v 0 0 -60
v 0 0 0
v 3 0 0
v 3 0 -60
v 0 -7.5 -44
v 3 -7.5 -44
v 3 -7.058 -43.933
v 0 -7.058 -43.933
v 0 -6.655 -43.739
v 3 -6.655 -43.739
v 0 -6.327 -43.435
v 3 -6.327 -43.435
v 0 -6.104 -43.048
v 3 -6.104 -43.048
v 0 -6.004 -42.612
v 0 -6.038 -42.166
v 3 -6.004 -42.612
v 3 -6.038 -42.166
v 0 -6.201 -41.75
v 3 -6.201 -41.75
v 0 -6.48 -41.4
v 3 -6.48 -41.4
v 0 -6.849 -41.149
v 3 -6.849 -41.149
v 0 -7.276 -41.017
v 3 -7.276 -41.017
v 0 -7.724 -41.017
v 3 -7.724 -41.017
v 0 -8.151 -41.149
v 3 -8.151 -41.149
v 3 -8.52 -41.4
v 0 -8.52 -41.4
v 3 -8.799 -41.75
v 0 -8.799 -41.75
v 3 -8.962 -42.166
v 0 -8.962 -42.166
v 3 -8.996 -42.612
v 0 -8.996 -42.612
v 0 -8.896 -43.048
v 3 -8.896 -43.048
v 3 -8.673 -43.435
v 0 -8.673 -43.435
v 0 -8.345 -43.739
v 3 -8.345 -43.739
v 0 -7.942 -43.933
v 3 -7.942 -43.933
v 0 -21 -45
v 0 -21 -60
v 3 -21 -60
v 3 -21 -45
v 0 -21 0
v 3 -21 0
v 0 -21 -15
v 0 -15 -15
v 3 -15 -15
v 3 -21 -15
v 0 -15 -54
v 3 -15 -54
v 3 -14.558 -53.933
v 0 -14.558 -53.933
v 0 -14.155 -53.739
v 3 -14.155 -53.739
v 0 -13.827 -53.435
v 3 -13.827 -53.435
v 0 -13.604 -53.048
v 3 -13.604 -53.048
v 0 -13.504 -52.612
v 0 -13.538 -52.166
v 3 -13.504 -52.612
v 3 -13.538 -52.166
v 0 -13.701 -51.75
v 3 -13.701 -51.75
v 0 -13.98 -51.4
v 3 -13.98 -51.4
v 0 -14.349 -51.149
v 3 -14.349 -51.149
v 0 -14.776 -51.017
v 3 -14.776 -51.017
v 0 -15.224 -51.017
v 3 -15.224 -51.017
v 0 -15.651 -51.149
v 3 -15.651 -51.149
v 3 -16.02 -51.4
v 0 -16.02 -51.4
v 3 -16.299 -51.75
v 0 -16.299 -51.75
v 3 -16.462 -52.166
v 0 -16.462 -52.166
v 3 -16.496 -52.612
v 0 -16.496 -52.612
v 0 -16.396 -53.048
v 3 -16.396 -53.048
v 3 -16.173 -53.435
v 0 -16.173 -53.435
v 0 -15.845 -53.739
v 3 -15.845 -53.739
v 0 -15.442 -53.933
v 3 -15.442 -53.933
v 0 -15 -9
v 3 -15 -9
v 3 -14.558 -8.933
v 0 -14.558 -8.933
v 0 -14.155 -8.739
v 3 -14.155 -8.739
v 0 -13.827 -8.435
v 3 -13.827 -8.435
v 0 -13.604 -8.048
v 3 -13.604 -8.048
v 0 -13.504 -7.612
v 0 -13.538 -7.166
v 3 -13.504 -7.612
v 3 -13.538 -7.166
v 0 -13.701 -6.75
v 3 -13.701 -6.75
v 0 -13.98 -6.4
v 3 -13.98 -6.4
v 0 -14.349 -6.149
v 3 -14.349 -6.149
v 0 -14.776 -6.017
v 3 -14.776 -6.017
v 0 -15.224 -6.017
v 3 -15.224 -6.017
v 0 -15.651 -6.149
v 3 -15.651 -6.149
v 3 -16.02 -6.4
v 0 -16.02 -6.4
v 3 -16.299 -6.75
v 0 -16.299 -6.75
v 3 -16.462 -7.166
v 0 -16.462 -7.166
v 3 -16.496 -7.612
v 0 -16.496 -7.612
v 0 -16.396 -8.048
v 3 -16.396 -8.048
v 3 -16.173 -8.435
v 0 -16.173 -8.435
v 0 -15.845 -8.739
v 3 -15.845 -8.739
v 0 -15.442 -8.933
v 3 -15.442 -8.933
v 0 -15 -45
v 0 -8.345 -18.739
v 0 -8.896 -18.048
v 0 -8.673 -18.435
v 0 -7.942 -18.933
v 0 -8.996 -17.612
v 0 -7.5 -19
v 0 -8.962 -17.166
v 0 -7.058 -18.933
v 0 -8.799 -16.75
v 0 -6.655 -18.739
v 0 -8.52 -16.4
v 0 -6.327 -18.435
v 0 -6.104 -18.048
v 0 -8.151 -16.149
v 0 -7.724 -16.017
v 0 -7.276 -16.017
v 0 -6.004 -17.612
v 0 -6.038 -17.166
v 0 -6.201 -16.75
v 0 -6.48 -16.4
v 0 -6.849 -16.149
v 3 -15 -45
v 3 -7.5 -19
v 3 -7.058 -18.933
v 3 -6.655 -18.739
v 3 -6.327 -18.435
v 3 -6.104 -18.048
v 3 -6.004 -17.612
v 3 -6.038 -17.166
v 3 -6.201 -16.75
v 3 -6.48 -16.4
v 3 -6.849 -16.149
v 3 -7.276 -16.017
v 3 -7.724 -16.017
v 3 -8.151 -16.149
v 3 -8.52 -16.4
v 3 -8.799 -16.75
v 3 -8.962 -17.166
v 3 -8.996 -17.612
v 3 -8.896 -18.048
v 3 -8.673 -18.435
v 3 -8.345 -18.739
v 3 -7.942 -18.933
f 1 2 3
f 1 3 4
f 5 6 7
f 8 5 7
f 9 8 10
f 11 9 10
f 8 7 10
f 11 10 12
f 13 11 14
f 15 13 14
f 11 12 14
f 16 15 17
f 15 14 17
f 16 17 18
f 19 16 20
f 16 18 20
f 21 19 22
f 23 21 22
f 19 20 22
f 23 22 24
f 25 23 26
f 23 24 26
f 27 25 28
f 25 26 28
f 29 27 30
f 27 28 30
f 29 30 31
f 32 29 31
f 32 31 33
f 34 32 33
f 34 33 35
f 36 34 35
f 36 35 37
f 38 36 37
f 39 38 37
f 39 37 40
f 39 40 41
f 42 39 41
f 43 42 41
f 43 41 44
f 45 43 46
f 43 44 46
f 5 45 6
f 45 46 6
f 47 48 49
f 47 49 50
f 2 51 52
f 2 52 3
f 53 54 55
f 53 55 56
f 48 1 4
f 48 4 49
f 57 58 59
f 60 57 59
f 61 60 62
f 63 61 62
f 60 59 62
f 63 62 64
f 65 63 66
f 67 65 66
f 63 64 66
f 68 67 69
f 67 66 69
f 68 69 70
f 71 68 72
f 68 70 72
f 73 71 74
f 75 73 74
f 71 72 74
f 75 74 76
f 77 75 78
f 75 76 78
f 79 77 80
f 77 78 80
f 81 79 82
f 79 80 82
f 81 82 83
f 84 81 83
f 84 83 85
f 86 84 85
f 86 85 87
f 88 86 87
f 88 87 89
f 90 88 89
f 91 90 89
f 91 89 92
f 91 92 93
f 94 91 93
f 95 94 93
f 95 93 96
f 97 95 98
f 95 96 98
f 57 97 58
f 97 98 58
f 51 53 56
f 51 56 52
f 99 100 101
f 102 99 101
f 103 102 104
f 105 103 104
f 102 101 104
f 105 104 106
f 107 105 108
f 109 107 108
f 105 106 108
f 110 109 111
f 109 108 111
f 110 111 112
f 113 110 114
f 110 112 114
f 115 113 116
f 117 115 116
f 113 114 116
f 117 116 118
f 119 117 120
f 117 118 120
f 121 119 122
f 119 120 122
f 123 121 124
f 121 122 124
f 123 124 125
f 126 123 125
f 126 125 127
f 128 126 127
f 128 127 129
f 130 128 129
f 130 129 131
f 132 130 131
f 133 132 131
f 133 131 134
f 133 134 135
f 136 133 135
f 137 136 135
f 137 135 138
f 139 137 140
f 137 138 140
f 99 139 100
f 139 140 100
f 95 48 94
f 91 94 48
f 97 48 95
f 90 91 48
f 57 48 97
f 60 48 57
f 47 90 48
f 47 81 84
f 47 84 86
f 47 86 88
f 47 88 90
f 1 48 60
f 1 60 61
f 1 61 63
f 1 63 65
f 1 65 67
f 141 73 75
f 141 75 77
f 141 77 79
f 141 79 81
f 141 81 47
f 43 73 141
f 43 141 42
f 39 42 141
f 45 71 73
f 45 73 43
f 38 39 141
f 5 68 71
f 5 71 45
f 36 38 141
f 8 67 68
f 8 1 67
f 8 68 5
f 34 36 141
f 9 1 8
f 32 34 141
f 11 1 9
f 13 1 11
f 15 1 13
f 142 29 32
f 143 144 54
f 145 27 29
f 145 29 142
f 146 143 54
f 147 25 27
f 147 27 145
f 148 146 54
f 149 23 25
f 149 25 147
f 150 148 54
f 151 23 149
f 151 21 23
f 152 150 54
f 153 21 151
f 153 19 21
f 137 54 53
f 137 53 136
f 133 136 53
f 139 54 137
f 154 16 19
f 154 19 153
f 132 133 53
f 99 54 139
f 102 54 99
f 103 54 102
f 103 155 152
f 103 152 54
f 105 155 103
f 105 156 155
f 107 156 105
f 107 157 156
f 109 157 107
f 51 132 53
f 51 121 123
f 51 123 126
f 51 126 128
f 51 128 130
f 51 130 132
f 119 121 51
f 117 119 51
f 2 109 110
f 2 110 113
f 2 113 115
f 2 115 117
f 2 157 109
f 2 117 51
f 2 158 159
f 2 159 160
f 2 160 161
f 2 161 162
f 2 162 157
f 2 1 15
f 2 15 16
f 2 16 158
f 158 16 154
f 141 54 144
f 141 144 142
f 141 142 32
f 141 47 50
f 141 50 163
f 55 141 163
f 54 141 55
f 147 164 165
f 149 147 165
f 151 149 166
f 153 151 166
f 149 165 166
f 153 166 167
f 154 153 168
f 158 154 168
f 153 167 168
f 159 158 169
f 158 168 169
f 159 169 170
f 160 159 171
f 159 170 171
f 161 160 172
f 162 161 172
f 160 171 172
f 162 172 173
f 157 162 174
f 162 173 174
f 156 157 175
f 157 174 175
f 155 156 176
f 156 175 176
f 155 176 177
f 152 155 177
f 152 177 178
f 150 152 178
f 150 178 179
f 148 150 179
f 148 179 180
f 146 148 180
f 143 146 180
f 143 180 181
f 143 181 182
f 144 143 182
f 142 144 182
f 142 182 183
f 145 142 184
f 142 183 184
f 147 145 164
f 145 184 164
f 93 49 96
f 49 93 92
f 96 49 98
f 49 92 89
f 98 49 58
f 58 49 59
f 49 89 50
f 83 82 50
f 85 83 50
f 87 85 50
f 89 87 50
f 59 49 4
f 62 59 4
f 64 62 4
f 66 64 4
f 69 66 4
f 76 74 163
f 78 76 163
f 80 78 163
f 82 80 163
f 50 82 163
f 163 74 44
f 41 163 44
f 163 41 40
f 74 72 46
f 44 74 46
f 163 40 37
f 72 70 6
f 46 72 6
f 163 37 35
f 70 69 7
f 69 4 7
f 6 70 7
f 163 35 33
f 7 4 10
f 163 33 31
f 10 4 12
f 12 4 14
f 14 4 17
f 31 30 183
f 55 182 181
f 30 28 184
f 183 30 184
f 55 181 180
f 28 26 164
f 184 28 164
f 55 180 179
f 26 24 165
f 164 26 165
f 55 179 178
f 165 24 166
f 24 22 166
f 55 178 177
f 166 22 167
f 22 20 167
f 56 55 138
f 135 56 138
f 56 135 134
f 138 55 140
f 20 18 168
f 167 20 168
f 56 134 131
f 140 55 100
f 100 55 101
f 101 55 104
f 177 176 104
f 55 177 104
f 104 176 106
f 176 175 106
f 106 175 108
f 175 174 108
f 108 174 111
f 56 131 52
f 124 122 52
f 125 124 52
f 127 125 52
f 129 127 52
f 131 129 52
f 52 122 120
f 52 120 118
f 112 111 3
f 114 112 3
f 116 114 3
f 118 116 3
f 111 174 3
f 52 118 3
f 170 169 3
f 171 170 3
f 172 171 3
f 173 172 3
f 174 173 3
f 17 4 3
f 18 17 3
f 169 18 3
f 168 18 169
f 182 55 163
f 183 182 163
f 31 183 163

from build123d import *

# Parameters (mm, degrees)
EXTRUDE_1_DEPTH     = 3
SKETCH_2_R          = 1.5
CUT_EXTRUDE_1_DEPTH = 3


with BuildPart() as part:
    # 草图1 → 凸台-拉伸1 (new body)
    with BuildSketch(Plane(origin=(0, 0, 0), x_dir=(0, 0, -1), z_dir=(1, 0, 0))):
        Polygon((0, 0), (60, 0), (60, -21), (45, -21), (45, -15), (15, -15), (15, -21), (0, -21), align=None)
    extrude(amount=EXTRUDE_1_DEPTH)

    # 草图2 → 切除-拉伸1 (cut)
    with BuildSketch(Plane(origin=(3, 0, 0), x_dir=(0, 0, -1), z_dir=(1, 0, 0))):
        with Locations((42.5, -7.5)):
            Circle(SKETCH_2_R)
        with Locations((17.5, -7.5)):
            Circle(SKETCH_2_R)
        with Locations((52.5, -15)):
            Circle(SKETCH_2_R)
        with Locations((7.5, -15)):
            Circle(SKETCH_2_R)
    extrude(amount=-CUT_EXTRUDE_1_DEPTH, mode=Mode.SUBTRACT)


solid = part.part
